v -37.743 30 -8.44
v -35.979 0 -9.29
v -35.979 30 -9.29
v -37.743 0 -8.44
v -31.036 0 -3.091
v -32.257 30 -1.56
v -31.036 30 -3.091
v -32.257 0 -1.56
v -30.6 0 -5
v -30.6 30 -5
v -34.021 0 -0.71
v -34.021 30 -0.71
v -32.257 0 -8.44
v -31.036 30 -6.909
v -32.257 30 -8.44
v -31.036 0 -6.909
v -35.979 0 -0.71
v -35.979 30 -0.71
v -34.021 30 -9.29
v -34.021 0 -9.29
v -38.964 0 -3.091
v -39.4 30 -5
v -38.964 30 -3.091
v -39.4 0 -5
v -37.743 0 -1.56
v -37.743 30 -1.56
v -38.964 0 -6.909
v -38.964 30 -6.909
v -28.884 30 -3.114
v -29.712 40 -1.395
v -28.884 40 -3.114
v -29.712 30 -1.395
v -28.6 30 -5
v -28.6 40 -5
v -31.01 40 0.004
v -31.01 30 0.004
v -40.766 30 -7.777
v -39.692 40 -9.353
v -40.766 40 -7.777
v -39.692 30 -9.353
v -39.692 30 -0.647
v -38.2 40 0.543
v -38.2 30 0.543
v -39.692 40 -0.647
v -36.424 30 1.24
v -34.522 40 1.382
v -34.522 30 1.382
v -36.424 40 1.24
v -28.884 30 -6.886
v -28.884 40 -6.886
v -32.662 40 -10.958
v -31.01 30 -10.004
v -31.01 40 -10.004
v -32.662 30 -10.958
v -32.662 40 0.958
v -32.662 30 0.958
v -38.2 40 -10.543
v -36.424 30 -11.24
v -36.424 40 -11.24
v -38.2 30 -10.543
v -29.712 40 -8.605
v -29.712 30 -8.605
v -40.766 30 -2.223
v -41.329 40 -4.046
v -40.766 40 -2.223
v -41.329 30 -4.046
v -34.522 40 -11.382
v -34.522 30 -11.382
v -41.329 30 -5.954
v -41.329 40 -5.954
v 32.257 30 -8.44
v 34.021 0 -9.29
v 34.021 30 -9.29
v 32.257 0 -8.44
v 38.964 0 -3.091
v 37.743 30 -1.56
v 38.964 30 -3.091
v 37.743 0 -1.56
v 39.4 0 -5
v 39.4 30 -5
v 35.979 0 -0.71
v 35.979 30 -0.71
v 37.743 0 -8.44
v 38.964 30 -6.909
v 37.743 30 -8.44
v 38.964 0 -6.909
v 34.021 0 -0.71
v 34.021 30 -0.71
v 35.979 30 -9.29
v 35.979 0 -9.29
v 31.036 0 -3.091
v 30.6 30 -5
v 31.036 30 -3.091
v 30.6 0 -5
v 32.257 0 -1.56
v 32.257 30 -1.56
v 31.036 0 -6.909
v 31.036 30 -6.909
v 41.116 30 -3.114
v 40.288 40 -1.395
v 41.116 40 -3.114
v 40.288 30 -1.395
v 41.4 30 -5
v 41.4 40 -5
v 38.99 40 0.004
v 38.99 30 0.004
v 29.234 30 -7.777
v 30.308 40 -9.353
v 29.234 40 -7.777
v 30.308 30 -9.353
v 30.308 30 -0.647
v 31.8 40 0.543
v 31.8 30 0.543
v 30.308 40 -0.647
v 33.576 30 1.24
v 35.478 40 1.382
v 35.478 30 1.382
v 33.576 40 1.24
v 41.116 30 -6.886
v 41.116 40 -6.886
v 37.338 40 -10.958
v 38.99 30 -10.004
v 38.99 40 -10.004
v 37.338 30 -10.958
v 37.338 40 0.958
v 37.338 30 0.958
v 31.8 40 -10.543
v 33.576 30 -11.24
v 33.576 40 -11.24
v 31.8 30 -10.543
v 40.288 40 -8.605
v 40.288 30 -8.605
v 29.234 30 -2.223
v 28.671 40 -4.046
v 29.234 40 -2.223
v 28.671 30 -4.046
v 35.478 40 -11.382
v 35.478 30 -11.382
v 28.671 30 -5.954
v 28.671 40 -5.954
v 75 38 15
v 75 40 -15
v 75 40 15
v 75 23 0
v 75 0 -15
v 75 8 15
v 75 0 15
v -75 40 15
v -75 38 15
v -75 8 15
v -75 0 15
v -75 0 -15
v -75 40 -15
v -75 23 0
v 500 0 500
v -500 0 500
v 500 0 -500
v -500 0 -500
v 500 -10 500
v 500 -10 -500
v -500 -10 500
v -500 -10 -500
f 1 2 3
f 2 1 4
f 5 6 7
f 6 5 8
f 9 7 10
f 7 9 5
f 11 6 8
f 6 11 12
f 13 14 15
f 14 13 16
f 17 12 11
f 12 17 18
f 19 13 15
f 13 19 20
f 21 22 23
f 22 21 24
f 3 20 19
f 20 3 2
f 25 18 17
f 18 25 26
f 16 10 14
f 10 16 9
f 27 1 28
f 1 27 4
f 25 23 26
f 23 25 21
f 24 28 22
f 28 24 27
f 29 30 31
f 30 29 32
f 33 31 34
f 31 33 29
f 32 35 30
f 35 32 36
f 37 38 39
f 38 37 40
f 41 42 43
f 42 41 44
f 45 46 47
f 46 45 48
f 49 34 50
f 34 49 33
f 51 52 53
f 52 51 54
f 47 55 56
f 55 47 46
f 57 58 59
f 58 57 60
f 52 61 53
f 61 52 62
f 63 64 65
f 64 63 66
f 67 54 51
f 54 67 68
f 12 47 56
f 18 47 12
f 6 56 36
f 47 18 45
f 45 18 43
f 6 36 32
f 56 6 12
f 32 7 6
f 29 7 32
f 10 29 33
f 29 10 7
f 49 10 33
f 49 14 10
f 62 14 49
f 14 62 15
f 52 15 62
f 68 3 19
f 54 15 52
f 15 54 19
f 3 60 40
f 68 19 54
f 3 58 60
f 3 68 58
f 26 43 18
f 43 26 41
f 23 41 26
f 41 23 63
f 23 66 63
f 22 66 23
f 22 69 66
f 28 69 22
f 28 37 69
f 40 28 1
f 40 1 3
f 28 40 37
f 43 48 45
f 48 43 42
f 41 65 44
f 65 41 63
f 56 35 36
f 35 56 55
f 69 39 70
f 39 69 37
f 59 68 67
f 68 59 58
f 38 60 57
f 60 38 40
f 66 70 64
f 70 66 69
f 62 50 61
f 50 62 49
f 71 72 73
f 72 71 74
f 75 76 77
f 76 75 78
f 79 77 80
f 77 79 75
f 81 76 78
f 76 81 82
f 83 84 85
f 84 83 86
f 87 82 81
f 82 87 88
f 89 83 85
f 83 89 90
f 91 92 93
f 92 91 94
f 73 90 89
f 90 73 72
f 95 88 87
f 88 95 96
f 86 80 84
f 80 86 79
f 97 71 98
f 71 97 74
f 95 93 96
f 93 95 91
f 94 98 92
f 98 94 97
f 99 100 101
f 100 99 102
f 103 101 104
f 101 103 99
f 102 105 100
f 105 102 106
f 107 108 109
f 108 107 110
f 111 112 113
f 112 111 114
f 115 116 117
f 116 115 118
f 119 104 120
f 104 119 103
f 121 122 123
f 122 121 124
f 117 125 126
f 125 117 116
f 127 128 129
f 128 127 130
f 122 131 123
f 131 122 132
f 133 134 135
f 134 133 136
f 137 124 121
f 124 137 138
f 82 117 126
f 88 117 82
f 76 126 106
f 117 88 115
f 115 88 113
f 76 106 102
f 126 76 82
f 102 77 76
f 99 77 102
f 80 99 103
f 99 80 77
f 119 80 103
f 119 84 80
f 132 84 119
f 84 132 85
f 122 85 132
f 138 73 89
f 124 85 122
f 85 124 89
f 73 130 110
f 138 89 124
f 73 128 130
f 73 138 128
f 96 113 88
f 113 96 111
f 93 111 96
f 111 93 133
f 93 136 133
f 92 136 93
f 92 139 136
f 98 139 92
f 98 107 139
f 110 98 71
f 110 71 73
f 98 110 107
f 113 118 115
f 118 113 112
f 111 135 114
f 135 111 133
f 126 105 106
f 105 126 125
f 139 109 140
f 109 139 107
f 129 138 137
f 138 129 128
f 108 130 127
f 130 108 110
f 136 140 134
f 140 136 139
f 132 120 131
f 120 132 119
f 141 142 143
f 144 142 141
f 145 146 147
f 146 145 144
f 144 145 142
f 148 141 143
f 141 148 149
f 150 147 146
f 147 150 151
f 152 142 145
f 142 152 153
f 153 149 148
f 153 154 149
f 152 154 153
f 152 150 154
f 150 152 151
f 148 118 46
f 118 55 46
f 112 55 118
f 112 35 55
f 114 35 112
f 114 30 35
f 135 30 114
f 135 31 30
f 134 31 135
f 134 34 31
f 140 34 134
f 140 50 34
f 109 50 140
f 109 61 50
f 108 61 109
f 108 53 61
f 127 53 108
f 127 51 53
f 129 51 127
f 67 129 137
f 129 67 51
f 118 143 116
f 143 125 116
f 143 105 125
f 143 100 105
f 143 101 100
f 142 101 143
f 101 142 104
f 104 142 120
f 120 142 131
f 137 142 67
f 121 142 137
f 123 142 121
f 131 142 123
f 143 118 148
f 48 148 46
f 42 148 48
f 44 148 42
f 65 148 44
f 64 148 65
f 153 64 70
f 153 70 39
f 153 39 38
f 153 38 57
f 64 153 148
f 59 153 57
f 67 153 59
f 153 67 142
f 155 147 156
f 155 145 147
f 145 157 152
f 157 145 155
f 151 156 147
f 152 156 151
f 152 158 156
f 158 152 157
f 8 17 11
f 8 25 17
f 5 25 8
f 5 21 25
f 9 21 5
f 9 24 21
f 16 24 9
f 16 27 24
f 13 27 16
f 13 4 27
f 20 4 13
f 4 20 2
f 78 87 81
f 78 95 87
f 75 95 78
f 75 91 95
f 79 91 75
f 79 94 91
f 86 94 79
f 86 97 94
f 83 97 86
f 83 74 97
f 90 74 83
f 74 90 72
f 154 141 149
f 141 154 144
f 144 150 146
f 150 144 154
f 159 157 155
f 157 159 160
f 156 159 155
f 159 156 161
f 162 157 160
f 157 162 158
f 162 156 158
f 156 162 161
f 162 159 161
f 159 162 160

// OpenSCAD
module detal(){
difference(){
    translate([0,20,0])
    cube(size=[150,40,30], center=true);
}
}
module bolt(){
    //bolt
    cylinder(r=4.4, h=150, center=true); 
    //faska
    translate([0,0,-40])cylinder(r=6.4, h=20, center=true);   
}

module wall(){
color("LightYellow")
    translate([0,-5,0])
        cube(size=[1000,10,1000], center=true);
}
module papka (){
    rotate([45,0,0])cube (size=[240,310,30],center=false);
}
wall();


module bolty(){
for (i=[-1,1]){
    rotate([90,0,0])
        translate([35*i,-5,0])
            bolt();
}
}

difference(){
    detal();
        translate([-120,23,0])papka();
    bolty();
    
}
